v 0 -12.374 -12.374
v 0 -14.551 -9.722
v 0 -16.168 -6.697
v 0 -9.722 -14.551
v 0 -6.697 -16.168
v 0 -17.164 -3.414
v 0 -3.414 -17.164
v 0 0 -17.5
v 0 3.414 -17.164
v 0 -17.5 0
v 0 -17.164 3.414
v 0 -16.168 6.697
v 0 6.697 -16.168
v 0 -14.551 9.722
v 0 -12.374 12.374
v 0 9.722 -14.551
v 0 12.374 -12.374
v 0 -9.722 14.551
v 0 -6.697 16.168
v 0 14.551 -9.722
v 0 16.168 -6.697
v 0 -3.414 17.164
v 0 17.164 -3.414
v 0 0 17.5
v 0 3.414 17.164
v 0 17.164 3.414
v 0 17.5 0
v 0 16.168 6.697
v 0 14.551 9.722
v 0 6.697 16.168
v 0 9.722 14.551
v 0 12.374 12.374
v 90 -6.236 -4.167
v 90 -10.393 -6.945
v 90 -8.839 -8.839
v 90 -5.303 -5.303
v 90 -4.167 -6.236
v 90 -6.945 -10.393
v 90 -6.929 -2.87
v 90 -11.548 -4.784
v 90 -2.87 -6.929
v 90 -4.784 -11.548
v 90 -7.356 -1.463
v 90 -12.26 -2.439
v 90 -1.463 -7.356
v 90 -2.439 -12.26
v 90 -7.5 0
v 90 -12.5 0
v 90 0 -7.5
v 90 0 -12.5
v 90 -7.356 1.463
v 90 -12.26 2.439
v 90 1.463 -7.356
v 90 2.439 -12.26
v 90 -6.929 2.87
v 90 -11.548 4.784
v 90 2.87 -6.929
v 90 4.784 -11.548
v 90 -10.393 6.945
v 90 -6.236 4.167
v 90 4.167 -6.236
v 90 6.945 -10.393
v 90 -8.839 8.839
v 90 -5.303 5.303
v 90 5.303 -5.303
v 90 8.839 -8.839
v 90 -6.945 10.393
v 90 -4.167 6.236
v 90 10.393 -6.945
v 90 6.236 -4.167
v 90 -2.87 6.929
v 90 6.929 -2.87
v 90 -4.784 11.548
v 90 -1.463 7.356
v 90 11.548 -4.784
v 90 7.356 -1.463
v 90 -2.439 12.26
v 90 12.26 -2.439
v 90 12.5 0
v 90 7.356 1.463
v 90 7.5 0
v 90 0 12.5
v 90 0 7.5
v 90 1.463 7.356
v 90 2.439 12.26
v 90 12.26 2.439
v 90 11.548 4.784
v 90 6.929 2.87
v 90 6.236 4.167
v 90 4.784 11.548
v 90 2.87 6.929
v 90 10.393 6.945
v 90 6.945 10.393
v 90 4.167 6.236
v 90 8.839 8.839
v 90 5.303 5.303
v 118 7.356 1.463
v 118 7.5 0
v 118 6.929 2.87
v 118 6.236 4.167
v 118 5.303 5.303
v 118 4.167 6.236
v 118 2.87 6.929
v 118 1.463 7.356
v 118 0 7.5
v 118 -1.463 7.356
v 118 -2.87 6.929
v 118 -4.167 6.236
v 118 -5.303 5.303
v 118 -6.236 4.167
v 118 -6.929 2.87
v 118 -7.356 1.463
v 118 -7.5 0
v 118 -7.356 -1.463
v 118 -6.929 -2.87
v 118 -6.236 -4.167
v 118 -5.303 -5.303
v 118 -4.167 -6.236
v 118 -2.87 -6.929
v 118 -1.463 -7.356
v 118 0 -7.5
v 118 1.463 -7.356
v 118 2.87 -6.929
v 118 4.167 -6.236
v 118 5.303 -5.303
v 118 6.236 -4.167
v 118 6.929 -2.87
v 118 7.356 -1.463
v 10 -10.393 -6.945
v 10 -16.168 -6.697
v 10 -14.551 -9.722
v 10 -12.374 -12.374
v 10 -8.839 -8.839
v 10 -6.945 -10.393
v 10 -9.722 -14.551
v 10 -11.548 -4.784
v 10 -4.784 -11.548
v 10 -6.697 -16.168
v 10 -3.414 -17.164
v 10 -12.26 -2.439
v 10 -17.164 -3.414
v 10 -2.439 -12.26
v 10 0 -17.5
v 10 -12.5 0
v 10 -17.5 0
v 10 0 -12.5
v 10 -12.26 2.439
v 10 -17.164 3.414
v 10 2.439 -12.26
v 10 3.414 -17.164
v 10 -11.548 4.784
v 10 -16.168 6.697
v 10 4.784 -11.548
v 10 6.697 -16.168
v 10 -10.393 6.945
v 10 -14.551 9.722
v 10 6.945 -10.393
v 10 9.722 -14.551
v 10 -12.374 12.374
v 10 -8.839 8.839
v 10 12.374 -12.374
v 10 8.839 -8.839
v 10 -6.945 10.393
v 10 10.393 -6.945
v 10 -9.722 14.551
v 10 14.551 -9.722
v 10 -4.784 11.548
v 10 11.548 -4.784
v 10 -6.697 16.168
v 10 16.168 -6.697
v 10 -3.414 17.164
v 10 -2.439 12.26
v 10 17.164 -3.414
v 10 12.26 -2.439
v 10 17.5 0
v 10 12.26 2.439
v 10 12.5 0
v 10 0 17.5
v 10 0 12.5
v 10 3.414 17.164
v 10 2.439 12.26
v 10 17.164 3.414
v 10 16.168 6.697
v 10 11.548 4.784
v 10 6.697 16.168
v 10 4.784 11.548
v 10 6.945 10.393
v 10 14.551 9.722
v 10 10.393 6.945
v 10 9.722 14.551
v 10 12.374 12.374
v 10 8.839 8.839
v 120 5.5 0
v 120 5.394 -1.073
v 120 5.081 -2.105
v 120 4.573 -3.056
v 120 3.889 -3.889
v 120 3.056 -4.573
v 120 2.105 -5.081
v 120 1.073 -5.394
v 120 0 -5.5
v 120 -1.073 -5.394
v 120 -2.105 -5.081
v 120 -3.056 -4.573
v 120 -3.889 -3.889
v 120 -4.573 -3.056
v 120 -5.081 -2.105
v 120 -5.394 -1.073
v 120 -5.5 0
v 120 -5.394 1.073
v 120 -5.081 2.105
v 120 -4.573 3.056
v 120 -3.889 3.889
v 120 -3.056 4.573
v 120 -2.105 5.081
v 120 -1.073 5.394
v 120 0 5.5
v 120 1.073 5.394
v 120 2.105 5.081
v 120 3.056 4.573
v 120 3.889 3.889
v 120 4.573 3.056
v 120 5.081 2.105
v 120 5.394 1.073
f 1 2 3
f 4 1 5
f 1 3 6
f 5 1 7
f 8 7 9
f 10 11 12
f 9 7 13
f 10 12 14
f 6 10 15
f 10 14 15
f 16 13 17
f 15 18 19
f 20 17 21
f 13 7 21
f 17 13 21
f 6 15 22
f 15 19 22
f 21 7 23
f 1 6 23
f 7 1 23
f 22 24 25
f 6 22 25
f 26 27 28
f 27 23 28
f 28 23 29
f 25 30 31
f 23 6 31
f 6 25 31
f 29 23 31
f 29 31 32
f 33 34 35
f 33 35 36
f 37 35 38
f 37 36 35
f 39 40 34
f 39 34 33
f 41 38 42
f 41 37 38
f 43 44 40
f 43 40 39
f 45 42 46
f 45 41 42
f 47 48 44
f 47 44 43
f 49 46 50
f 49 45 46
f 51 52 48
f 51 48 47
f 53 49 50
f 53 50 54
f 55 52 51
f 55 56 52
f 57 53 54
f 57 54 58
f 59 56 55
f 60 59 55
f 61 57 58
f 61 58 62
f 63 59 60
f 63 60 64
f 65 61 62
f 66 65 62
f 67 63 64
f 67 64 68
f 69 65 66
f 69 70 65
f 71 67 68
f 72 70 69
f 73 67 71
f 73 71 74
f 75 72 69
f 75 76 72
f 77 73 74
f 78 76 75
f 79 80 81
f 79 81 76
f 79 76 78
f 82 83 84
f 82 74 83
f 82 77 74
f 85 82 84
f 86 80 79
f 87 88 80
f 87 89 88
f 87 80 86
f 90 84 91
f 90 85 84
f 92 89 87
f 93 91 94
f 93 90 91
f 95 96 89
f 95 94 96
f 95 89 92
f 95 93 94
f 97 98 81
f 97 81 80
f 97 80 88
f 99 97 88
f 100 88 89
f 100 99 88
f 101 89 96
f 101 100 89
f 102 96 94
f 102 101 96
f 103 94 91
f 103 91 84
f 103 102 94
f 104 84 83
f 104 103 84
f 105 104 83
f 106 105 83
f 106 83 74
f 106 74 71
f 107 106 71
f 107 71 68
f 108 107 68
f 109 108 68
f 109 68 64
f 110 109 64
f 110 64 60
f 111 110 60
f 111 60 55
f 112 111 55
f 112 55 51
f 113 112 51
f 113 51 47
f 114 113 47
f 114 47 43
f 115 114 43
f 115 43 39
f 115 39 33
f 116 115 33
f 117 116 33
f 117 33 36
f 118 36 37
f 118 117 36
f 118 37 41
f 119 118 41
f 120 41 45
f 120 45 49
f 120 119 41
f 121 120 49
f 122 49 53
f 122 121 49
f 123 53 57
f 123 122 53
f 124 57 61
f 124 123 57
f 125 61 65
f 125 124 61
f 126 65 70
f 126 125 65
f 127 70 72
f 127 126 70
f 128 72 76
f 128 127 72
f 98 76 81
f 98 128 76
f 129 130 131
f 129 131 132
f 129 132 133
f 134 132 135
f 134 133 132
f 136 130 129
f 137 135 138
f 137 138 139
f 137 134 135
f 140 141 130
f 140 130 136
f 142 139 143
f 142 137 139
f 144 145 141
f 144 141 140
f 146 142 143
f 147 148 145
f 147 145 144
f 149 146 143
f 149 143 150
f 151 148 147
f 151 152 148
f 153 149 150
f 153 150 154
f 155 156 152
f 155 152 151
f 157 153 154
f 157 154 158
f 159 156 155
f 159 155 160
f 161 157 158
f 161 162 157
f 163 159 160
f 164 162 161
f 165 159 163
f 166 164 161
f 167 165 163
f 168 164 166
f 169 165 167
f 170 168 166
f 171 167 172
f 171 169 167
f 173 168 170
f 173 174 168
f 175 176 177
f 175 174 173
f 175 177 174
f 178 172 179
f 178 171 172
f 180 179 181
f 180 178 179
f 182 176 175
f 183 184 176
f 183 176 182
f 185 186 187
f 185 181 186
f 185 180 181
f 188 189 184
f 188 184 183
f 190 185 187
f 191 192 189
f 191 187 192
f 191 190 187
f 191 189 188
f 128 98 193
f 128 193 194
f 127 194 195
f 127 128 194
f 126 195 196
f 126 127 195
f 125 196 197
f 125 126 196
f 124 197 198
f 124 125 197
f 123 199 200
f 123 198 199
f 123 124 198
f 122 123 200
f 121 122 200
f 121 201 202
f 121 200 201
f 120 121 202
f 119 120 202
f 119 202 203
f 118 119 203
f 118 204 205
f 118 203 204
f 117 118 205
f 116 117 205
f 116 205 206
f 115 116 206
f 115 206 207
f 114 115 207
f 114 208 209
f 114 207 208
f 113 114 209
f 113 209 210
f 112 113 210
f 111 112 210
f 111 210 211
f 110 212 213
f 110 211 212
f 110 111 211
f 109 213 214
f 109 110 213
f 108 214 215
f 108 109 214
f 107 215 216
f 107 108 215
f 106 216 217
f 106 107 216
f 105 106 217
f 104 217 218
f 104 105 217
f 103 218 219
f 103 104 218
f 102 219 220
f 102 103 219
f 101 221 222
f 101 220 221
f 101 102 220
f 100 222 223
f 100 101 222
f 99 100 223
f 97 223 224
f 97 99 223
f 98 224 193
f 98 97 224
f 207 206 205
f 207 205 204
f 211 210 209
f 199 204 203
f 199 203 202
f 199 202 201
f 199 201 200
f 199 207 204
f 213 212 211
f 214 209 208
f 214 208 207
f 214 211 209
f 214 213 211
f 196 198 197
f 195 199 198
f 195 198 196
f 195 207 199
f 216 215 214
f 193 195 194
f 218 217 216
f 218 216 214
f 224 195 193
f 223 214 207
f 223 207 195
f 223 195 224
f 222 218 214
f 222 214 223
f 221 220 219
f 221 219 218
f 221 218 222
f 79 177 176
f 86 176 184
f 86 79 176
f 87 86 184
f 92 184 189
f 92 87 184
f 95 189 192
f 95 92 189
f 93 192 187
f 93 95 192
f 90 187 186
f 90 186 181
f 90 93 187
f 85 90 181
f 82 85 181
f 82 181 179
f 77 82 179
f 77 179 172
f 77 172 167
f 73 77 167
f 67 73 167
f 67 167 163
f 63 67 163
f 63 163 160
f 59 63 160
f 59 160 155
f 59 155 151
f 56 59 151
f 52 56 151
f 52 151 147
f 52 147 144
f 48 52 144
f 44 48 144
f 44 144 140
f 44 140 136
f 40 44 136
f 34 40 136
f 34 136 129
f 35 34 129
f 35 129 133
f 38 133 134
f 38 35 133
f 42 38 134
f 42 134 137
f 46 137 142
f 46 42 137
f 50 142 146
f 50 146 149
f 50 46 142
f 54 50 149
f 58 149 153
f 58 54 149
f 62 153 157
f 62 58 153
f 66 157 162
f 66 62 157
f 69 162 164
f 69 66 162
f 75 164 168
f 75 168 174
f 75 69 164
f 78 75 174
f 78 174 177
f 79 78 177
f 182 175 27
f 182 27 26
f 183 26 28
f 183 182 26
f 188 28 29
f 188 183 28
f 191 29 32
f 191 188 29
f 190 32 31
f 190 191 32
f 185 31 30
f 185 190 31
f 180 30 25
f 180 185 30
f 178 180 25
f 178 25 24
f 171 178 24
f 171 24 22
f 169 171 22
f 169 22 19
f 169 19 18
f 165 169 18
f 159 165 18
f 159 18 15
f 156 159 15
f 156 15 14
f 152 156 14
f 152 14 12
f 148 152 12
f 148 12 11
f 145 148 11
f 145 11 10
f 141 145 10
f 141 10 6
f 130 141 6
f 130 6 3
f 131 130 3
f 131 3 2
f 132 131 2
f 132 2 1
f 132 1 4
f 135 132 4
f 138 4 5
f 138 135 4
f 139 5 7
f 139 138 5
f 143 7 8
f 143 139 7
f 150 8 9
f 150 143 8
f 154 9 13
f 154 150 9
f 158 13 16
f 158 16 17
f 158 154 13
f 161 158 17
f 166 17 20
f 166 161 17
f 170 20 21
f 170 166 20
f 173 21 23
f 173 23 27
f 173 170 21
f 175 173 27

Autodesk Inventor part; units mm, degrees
ref_plane "Начальная плоскость" through (0, 0, 0) normal (1, 0, 0) x (0, 1, 0)
ref_plane "XZ Plane" through (0, 0, 0) normal (0, 1, 0) x (-1, 0, 0)
ref_plane "XY Plane" through (0, 0, 0) normal (0, 0, 1) x (1, 0, 0)
sketch "Основной эскиз" plane through (0, 0, 0) normal (0, 0, 1) x (1, 0, 0)
  line L0 (0, 0) -> (120, 0)
  line L1 (0, 0) -> (0, 17.5)
  line L2 (10, 17.5) -> (10, 12.5)
  line L3 (0, 17.5) -> (10, 17.5)
  line L4 (90, 12.5) -> (90, 7.5)
  line L5 (10, 12.5) -> (90, 12.5)
  line L6 (120, 7.5) -> (120, 0)
  line L7 (90, 7.5) -> (120, 7.5)
  dimension "d3" = 35
  dimension "d4" = 25
  dimension "d5" = 15
revolve "Вращение1" add sketch "Основной эскиз" angle 360 about axis through (0, 0, 0) along (1, 0, 0)
chamfer "Фаска1" distance 2 angle 45 1 edges at (120, -7.5, 0) measured on face at (100, 7.4757, -0.6035)
properties part number "Вал" material "Steel"
